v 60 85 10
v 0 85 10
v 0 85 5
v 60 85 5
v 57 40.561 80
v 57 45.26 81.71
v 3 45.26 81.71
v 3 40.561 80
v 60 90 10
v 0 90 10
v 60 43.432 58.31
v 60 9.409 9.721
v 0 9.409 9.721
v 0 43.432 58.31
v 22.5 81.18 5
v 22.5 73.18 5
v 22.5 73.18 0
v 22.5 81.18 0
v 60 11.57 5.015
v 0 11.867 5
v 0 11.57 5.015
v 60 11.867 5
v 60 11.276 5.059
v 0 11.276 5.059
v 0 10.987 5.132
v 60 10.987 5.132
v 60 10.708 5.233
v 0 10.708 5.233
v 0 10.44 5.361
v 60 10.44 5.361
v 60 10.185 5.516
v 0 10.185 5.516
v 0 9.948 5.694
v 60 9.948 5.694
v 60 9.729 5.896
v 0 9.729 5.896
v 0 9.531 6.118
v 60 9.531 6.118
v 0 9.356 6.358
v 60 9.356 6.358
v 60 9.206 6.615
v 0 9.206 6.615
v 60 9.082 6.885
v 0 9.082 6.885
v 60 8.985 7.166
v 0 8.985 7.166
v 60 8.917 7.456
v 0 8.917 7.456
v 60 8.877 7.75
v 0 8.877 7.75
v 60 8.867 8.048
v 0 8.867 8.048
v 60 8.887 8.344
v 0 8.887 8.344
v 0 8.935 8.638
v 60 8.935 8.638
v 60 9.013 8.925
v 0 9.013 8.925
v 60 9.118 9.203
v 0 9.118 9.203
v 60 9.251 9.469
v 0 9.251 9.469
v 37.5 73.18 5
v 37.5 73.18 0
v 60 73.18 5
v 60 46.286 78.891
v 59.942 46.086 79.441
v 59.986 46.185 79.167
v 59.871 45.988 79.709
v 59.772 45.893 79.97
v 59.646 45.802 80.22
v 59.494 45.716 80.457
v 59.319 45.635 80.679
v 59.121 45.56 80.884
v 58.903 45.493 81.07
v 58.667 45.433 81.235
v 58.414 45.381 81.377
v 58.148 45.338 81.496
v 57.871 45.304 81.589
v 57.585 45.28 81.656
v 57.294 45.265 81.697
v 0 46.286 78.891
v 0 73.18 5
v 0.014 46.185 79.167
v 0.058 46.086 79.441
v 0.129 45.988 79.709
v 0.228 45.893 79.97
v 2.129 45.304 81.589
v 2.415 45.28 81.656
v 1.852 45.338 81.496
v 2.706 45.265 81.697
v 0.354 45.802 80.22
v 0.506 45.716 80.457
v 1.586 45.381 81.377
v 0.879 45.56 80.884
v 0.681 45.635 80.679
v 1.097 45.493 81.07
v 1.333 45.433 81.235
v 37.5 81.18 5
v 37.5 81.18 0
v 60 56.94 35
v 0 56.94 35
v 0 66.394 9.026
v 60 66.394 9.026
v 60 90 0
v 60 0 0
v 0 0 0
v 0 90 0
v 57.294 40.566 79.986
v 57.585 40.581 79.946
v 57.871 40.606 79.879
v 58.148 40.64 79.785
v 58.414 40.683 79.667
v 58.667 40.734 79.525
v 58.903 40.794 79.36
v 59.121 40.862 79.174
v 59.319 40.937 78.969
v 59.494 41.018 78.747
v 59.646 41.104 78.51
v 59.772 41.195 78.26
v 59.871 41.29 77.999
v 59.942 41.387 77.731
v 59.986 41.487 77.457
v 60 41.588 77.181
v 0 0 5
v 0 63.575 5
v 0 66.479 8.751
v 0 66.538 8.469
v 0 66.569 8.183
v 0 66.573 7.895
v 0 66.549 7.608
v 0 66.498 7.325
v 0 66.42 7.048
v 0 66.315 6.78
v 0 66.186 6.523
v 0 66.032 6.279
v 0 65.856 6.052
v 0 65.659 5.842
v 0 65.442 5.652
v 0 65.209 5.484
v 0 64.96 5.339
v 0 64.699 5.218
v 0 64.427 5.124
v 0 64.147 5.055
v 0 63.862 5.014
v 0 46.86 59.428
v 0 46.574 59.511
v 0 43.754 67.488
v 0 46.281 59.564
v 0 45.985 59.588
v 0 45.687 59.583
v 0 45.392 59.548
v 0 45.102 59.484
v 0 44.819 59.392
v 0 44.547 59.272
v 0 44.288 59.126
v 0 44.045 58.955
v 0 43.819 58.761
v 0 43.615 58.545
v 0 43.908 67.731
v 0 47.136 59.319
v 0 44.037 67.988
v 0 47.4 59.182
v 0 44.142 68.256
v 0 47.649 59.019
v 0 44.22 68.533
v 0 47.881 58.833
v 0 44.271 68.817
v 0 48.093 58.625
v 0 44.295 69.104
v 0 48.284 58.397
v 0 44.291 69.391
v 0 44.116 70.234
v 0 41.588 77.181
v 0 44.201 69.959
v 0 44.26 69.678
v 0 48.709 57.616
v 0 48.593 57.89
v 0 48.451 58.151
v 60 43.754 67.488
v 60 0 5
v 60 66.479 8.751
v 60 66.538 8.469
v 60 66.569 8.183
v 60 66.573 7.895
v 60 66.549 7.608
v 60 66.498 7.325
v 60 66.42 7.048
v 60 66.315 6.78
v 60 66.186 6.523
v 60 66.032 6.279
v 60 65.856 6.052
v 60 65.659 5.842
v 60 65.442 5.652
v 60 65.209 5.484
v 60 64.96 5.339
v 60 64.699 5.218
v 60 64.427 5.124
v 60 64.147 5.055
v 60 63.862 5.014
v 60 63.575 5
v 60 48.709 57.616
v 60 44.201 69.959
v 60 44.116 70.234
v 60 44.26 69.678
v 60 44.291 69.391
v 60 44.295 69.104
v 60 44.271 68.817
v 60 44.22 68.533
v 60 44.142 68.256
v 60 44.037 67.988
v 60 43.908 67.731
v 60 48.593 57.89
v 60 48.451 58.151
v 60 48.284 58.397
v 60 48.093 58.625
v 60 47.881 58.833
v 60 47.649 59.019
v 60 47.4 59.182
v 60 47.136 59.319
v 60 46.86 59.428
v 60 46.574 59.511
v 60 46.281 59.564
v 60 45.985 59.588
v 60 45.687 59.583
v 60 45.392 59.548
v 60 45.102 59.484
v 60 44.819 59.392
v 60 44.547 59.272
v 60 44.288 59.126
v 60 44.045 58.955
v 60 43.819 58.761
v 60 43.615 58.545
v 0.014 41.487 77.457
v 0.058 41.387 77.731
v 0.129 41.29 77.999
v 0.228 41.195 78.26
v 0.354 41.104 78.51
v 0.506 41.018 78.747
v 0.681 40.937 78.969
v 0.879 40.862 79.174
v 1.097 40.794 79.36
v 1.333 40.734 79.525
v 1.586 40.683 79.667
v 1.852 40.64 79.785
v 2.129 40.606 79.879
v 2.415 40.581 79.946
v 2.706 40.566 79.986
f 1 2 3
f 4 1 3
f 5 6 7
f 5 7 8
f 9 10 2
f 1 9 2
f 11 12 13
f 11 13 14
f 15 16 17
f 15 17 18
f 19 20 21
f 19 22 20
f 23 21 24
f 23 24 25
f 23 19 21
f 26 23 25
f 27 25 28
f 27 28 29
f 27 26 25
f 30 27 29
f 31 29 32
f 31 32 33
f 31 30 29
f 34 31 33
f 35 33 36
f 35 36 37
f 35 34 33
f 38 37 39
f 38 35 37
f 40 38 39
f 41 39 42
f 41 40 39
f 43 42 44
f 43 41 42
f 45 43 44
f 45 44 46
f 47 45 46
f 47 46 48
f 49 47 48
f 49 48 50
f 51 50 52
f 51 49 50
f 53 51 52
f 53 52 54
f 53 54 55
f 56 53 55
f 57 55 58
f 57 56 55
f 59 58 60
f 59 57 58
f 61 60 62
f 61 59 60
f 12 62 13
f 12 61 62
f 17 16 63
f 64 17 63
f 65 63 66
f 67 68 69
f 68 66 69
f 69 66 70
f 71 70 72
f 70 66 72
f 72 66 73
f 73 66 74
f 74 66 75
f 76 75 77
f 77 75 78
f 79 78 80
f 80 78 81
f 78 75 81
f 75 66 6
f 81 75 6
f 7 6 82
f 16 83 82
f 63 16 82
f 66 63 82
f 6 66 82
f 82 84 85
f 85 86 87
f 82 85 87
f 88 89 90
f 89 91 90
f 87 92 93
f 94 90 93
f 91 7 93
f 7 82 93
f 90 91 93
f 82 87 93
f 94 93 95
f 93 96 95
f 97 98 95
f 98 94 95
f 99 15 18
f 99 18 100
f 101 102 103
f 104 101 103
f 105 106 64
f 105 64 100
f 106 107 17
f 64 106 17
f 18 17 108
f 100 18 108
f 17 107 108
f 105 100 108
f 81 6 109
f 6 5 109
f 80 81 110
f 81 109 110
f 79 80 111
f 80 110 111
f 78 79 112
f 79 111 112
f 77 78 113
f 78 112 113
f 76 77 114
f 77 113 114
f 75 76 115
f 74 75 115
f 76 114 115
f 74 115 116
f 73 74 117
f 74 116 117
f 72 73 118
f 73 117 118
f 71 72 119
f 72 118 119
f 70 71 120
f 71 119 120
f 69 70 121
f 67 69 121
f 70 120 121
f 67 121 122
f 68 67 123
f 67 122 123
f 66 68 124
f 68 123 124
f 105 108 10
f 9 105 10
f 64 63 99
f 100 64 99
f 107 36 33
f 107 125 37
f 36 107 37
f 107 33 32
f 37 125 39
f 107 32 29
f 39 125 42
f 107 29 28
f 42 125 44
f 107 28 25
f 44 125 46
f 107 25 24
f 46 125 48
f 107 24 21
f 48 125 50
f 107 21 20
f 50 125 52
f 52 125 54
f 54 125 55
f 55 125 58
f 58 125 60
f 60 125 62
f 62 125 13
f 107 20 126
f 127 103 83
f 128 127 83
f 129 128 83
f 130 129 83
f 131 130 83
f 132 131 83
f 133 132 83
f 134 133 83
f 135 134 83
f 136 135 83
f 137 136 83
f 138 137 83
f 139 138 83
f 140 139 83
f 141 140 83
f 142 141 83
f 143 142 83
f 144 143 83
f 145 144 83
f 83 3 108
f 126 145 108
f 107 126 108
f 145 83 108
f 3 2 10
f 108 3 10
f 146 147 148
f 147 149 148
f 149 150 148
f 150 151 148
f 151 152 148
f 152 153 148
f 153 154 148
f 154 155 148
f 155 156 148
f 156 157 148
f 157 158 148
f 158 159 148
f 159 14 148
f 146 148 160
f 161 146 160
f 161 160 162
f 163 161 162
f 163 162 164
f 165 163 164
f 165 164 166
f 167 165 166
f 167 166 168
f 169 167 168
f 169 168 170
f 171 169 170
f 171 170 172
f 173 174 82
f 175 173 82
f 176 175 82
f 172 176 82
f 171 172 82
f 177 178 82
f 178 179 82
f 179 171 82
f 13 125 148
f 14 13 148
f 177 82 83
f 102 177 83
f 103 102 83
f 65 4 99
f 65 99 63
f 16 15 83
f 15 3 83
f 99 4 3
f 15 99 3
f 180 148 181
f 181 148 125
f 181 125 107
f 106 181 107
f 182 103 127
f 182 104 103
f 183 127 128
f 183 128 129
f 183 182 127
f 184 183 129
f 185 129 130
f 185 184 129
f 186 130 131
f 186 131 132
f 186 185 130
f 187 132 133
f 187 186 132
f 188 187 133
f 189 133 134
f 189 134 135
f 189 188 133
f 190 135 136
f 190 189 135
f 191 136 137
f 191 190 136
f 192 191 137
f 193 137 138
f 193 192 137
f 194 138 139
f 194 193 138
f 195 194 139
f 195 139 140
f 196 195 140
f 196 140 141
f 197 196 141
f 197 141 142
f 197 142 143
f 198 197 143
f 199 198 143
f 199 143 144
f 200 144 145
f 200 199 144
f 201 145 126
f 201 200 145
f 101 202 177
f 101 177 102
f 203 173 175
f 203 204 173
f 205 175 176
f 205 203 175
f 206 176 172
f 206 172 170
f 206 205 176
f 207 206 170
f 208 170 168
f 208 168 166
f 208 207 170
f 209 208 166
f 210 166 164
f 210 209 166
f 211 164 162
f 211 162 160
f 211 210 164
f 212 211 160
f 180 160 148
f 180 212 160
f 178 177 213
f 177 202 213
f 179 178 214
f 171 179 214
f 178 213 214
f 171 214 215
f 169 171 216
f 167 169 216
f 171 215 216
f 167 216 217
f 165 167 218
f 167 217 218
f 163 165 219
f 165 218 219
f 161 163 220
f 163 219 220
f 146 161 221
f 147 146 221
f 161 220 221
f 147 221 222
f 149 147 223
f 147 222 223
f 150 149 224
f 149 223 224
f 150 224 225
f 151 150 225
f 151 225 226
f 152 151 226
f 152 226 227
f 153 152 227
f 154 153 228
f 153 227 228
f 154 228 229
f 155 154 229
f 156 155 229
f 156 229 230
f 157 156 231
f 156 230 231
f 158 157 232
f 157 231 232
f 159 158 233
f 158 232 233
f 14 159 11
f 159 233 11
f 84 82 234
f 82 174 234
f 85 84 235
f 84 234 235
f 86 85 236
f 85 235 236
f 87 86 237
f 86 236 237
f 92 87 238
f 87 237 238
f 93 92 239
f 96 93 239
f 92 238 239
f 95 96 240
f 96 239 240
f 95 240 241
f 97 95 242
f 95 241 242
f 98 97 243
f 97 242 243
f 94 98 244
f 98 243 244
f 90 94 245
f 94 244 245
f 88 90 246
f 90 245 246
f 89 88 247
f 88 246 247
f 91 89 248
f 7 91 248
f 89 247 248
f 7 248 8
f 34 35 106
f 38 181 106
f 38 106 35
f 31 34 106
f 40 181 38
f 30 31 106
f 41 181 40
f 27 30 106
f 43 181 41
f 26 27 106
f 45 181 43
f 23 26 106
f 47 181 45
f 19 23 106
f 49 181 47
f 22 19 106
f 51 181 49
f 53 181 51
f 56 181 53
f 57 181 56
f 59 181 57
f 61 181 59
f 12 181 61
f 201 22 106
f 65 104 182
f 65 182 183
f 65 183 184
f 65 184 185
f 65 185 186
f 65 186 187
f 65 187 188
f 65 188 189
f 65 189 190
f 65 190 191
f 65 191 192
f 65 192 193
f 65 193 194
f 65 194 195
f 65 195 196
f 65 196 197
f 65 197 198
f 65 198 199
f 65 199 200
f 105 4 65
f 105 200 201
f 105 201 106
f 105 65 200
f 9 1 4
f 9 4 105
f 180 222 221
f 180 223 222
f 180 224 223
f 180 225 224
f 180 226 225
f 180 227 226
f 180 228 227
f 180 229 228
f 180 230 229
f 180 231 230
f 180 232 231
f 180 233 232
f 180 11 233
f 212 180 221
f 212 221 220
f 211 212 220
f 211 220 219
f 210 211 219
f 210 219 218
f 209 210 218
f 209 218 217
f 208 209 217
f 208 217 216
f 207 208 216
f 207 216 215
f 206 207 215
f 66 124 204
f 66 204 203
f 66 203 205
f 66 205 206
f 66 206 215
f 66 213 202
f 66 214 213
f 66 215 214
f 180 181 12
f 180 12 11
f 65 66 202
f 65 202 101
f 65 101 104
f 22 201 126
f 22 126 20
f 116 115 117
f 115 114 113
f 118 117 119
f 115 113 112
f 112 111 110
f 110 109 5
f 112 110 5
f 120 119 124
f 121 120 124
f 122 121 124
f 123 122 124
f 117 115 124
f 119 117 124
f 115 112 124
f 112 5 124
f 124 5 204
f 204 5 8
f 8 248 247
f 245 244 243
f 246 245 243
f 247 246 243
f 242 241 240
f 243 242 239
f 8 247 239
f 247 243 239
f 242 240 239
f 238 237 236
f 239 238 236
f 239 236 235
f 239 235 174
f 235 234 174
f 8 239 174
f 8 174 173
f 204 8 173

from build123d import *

# Parameters (mm, degrees)
F1_DEPTH = 60
F2_R     = 3
F3_R     = 3
F5_W     = 15
F5_H     = 8
F6_DEPTH = 25


with BuildPart() as f1:
    # F0 (on Right) → F1 (new body)
    with BuildSketch(Plane.YZ):
        Polygon((0, 0), (90, 0), (90, 10), (85, 10), (85, 5), (73.1801488287, 5), (45.2599553973, 81.7101009996), (40.5614915158, 80), (44.6500255673, 68.7668450149), (0, 5), align=None)
        Polygon((56.9401520578, 35), (67.8592590858, 5), (6.1038729438, 5), (27.583580996, 35.6762022401), (46.7376730664, 63.0310806514), align=None, mode=Mode.SUBTRACT)
    extrude(amount=F1_DEPTH)

    # F2
    f2_edges = [f1.edges().sort_by_distance(p)[0] for p in [
        (30, 6.103873, 5),
        (30, 67.859259, 5),
        (30, 46.737673, 63.031081),
        (30, 44.650026, 68.766845),
    ]]
    fillet(f2_edges, radius=F2_R)

    # F3
    f3_edges = [f1.edges().sort_by_distance(p)[0] for p in [
        (60, 42.910723, 80.85505),
        (0, 42.910723, 80.85505),
    ]]
    fillet(f3_edges, radius=F3_R)

    # F5 (on offset) → F6 (cut)
    with BuildSketch(Plane.XY.offset(5)):
        with Locations((30, 77.1801488287)):
            Rectangle(F5_W, F5_H)
    extrude(amount=-F6_DEPTH, mode=Mode.SUBTRACT)


solid = f1.part
